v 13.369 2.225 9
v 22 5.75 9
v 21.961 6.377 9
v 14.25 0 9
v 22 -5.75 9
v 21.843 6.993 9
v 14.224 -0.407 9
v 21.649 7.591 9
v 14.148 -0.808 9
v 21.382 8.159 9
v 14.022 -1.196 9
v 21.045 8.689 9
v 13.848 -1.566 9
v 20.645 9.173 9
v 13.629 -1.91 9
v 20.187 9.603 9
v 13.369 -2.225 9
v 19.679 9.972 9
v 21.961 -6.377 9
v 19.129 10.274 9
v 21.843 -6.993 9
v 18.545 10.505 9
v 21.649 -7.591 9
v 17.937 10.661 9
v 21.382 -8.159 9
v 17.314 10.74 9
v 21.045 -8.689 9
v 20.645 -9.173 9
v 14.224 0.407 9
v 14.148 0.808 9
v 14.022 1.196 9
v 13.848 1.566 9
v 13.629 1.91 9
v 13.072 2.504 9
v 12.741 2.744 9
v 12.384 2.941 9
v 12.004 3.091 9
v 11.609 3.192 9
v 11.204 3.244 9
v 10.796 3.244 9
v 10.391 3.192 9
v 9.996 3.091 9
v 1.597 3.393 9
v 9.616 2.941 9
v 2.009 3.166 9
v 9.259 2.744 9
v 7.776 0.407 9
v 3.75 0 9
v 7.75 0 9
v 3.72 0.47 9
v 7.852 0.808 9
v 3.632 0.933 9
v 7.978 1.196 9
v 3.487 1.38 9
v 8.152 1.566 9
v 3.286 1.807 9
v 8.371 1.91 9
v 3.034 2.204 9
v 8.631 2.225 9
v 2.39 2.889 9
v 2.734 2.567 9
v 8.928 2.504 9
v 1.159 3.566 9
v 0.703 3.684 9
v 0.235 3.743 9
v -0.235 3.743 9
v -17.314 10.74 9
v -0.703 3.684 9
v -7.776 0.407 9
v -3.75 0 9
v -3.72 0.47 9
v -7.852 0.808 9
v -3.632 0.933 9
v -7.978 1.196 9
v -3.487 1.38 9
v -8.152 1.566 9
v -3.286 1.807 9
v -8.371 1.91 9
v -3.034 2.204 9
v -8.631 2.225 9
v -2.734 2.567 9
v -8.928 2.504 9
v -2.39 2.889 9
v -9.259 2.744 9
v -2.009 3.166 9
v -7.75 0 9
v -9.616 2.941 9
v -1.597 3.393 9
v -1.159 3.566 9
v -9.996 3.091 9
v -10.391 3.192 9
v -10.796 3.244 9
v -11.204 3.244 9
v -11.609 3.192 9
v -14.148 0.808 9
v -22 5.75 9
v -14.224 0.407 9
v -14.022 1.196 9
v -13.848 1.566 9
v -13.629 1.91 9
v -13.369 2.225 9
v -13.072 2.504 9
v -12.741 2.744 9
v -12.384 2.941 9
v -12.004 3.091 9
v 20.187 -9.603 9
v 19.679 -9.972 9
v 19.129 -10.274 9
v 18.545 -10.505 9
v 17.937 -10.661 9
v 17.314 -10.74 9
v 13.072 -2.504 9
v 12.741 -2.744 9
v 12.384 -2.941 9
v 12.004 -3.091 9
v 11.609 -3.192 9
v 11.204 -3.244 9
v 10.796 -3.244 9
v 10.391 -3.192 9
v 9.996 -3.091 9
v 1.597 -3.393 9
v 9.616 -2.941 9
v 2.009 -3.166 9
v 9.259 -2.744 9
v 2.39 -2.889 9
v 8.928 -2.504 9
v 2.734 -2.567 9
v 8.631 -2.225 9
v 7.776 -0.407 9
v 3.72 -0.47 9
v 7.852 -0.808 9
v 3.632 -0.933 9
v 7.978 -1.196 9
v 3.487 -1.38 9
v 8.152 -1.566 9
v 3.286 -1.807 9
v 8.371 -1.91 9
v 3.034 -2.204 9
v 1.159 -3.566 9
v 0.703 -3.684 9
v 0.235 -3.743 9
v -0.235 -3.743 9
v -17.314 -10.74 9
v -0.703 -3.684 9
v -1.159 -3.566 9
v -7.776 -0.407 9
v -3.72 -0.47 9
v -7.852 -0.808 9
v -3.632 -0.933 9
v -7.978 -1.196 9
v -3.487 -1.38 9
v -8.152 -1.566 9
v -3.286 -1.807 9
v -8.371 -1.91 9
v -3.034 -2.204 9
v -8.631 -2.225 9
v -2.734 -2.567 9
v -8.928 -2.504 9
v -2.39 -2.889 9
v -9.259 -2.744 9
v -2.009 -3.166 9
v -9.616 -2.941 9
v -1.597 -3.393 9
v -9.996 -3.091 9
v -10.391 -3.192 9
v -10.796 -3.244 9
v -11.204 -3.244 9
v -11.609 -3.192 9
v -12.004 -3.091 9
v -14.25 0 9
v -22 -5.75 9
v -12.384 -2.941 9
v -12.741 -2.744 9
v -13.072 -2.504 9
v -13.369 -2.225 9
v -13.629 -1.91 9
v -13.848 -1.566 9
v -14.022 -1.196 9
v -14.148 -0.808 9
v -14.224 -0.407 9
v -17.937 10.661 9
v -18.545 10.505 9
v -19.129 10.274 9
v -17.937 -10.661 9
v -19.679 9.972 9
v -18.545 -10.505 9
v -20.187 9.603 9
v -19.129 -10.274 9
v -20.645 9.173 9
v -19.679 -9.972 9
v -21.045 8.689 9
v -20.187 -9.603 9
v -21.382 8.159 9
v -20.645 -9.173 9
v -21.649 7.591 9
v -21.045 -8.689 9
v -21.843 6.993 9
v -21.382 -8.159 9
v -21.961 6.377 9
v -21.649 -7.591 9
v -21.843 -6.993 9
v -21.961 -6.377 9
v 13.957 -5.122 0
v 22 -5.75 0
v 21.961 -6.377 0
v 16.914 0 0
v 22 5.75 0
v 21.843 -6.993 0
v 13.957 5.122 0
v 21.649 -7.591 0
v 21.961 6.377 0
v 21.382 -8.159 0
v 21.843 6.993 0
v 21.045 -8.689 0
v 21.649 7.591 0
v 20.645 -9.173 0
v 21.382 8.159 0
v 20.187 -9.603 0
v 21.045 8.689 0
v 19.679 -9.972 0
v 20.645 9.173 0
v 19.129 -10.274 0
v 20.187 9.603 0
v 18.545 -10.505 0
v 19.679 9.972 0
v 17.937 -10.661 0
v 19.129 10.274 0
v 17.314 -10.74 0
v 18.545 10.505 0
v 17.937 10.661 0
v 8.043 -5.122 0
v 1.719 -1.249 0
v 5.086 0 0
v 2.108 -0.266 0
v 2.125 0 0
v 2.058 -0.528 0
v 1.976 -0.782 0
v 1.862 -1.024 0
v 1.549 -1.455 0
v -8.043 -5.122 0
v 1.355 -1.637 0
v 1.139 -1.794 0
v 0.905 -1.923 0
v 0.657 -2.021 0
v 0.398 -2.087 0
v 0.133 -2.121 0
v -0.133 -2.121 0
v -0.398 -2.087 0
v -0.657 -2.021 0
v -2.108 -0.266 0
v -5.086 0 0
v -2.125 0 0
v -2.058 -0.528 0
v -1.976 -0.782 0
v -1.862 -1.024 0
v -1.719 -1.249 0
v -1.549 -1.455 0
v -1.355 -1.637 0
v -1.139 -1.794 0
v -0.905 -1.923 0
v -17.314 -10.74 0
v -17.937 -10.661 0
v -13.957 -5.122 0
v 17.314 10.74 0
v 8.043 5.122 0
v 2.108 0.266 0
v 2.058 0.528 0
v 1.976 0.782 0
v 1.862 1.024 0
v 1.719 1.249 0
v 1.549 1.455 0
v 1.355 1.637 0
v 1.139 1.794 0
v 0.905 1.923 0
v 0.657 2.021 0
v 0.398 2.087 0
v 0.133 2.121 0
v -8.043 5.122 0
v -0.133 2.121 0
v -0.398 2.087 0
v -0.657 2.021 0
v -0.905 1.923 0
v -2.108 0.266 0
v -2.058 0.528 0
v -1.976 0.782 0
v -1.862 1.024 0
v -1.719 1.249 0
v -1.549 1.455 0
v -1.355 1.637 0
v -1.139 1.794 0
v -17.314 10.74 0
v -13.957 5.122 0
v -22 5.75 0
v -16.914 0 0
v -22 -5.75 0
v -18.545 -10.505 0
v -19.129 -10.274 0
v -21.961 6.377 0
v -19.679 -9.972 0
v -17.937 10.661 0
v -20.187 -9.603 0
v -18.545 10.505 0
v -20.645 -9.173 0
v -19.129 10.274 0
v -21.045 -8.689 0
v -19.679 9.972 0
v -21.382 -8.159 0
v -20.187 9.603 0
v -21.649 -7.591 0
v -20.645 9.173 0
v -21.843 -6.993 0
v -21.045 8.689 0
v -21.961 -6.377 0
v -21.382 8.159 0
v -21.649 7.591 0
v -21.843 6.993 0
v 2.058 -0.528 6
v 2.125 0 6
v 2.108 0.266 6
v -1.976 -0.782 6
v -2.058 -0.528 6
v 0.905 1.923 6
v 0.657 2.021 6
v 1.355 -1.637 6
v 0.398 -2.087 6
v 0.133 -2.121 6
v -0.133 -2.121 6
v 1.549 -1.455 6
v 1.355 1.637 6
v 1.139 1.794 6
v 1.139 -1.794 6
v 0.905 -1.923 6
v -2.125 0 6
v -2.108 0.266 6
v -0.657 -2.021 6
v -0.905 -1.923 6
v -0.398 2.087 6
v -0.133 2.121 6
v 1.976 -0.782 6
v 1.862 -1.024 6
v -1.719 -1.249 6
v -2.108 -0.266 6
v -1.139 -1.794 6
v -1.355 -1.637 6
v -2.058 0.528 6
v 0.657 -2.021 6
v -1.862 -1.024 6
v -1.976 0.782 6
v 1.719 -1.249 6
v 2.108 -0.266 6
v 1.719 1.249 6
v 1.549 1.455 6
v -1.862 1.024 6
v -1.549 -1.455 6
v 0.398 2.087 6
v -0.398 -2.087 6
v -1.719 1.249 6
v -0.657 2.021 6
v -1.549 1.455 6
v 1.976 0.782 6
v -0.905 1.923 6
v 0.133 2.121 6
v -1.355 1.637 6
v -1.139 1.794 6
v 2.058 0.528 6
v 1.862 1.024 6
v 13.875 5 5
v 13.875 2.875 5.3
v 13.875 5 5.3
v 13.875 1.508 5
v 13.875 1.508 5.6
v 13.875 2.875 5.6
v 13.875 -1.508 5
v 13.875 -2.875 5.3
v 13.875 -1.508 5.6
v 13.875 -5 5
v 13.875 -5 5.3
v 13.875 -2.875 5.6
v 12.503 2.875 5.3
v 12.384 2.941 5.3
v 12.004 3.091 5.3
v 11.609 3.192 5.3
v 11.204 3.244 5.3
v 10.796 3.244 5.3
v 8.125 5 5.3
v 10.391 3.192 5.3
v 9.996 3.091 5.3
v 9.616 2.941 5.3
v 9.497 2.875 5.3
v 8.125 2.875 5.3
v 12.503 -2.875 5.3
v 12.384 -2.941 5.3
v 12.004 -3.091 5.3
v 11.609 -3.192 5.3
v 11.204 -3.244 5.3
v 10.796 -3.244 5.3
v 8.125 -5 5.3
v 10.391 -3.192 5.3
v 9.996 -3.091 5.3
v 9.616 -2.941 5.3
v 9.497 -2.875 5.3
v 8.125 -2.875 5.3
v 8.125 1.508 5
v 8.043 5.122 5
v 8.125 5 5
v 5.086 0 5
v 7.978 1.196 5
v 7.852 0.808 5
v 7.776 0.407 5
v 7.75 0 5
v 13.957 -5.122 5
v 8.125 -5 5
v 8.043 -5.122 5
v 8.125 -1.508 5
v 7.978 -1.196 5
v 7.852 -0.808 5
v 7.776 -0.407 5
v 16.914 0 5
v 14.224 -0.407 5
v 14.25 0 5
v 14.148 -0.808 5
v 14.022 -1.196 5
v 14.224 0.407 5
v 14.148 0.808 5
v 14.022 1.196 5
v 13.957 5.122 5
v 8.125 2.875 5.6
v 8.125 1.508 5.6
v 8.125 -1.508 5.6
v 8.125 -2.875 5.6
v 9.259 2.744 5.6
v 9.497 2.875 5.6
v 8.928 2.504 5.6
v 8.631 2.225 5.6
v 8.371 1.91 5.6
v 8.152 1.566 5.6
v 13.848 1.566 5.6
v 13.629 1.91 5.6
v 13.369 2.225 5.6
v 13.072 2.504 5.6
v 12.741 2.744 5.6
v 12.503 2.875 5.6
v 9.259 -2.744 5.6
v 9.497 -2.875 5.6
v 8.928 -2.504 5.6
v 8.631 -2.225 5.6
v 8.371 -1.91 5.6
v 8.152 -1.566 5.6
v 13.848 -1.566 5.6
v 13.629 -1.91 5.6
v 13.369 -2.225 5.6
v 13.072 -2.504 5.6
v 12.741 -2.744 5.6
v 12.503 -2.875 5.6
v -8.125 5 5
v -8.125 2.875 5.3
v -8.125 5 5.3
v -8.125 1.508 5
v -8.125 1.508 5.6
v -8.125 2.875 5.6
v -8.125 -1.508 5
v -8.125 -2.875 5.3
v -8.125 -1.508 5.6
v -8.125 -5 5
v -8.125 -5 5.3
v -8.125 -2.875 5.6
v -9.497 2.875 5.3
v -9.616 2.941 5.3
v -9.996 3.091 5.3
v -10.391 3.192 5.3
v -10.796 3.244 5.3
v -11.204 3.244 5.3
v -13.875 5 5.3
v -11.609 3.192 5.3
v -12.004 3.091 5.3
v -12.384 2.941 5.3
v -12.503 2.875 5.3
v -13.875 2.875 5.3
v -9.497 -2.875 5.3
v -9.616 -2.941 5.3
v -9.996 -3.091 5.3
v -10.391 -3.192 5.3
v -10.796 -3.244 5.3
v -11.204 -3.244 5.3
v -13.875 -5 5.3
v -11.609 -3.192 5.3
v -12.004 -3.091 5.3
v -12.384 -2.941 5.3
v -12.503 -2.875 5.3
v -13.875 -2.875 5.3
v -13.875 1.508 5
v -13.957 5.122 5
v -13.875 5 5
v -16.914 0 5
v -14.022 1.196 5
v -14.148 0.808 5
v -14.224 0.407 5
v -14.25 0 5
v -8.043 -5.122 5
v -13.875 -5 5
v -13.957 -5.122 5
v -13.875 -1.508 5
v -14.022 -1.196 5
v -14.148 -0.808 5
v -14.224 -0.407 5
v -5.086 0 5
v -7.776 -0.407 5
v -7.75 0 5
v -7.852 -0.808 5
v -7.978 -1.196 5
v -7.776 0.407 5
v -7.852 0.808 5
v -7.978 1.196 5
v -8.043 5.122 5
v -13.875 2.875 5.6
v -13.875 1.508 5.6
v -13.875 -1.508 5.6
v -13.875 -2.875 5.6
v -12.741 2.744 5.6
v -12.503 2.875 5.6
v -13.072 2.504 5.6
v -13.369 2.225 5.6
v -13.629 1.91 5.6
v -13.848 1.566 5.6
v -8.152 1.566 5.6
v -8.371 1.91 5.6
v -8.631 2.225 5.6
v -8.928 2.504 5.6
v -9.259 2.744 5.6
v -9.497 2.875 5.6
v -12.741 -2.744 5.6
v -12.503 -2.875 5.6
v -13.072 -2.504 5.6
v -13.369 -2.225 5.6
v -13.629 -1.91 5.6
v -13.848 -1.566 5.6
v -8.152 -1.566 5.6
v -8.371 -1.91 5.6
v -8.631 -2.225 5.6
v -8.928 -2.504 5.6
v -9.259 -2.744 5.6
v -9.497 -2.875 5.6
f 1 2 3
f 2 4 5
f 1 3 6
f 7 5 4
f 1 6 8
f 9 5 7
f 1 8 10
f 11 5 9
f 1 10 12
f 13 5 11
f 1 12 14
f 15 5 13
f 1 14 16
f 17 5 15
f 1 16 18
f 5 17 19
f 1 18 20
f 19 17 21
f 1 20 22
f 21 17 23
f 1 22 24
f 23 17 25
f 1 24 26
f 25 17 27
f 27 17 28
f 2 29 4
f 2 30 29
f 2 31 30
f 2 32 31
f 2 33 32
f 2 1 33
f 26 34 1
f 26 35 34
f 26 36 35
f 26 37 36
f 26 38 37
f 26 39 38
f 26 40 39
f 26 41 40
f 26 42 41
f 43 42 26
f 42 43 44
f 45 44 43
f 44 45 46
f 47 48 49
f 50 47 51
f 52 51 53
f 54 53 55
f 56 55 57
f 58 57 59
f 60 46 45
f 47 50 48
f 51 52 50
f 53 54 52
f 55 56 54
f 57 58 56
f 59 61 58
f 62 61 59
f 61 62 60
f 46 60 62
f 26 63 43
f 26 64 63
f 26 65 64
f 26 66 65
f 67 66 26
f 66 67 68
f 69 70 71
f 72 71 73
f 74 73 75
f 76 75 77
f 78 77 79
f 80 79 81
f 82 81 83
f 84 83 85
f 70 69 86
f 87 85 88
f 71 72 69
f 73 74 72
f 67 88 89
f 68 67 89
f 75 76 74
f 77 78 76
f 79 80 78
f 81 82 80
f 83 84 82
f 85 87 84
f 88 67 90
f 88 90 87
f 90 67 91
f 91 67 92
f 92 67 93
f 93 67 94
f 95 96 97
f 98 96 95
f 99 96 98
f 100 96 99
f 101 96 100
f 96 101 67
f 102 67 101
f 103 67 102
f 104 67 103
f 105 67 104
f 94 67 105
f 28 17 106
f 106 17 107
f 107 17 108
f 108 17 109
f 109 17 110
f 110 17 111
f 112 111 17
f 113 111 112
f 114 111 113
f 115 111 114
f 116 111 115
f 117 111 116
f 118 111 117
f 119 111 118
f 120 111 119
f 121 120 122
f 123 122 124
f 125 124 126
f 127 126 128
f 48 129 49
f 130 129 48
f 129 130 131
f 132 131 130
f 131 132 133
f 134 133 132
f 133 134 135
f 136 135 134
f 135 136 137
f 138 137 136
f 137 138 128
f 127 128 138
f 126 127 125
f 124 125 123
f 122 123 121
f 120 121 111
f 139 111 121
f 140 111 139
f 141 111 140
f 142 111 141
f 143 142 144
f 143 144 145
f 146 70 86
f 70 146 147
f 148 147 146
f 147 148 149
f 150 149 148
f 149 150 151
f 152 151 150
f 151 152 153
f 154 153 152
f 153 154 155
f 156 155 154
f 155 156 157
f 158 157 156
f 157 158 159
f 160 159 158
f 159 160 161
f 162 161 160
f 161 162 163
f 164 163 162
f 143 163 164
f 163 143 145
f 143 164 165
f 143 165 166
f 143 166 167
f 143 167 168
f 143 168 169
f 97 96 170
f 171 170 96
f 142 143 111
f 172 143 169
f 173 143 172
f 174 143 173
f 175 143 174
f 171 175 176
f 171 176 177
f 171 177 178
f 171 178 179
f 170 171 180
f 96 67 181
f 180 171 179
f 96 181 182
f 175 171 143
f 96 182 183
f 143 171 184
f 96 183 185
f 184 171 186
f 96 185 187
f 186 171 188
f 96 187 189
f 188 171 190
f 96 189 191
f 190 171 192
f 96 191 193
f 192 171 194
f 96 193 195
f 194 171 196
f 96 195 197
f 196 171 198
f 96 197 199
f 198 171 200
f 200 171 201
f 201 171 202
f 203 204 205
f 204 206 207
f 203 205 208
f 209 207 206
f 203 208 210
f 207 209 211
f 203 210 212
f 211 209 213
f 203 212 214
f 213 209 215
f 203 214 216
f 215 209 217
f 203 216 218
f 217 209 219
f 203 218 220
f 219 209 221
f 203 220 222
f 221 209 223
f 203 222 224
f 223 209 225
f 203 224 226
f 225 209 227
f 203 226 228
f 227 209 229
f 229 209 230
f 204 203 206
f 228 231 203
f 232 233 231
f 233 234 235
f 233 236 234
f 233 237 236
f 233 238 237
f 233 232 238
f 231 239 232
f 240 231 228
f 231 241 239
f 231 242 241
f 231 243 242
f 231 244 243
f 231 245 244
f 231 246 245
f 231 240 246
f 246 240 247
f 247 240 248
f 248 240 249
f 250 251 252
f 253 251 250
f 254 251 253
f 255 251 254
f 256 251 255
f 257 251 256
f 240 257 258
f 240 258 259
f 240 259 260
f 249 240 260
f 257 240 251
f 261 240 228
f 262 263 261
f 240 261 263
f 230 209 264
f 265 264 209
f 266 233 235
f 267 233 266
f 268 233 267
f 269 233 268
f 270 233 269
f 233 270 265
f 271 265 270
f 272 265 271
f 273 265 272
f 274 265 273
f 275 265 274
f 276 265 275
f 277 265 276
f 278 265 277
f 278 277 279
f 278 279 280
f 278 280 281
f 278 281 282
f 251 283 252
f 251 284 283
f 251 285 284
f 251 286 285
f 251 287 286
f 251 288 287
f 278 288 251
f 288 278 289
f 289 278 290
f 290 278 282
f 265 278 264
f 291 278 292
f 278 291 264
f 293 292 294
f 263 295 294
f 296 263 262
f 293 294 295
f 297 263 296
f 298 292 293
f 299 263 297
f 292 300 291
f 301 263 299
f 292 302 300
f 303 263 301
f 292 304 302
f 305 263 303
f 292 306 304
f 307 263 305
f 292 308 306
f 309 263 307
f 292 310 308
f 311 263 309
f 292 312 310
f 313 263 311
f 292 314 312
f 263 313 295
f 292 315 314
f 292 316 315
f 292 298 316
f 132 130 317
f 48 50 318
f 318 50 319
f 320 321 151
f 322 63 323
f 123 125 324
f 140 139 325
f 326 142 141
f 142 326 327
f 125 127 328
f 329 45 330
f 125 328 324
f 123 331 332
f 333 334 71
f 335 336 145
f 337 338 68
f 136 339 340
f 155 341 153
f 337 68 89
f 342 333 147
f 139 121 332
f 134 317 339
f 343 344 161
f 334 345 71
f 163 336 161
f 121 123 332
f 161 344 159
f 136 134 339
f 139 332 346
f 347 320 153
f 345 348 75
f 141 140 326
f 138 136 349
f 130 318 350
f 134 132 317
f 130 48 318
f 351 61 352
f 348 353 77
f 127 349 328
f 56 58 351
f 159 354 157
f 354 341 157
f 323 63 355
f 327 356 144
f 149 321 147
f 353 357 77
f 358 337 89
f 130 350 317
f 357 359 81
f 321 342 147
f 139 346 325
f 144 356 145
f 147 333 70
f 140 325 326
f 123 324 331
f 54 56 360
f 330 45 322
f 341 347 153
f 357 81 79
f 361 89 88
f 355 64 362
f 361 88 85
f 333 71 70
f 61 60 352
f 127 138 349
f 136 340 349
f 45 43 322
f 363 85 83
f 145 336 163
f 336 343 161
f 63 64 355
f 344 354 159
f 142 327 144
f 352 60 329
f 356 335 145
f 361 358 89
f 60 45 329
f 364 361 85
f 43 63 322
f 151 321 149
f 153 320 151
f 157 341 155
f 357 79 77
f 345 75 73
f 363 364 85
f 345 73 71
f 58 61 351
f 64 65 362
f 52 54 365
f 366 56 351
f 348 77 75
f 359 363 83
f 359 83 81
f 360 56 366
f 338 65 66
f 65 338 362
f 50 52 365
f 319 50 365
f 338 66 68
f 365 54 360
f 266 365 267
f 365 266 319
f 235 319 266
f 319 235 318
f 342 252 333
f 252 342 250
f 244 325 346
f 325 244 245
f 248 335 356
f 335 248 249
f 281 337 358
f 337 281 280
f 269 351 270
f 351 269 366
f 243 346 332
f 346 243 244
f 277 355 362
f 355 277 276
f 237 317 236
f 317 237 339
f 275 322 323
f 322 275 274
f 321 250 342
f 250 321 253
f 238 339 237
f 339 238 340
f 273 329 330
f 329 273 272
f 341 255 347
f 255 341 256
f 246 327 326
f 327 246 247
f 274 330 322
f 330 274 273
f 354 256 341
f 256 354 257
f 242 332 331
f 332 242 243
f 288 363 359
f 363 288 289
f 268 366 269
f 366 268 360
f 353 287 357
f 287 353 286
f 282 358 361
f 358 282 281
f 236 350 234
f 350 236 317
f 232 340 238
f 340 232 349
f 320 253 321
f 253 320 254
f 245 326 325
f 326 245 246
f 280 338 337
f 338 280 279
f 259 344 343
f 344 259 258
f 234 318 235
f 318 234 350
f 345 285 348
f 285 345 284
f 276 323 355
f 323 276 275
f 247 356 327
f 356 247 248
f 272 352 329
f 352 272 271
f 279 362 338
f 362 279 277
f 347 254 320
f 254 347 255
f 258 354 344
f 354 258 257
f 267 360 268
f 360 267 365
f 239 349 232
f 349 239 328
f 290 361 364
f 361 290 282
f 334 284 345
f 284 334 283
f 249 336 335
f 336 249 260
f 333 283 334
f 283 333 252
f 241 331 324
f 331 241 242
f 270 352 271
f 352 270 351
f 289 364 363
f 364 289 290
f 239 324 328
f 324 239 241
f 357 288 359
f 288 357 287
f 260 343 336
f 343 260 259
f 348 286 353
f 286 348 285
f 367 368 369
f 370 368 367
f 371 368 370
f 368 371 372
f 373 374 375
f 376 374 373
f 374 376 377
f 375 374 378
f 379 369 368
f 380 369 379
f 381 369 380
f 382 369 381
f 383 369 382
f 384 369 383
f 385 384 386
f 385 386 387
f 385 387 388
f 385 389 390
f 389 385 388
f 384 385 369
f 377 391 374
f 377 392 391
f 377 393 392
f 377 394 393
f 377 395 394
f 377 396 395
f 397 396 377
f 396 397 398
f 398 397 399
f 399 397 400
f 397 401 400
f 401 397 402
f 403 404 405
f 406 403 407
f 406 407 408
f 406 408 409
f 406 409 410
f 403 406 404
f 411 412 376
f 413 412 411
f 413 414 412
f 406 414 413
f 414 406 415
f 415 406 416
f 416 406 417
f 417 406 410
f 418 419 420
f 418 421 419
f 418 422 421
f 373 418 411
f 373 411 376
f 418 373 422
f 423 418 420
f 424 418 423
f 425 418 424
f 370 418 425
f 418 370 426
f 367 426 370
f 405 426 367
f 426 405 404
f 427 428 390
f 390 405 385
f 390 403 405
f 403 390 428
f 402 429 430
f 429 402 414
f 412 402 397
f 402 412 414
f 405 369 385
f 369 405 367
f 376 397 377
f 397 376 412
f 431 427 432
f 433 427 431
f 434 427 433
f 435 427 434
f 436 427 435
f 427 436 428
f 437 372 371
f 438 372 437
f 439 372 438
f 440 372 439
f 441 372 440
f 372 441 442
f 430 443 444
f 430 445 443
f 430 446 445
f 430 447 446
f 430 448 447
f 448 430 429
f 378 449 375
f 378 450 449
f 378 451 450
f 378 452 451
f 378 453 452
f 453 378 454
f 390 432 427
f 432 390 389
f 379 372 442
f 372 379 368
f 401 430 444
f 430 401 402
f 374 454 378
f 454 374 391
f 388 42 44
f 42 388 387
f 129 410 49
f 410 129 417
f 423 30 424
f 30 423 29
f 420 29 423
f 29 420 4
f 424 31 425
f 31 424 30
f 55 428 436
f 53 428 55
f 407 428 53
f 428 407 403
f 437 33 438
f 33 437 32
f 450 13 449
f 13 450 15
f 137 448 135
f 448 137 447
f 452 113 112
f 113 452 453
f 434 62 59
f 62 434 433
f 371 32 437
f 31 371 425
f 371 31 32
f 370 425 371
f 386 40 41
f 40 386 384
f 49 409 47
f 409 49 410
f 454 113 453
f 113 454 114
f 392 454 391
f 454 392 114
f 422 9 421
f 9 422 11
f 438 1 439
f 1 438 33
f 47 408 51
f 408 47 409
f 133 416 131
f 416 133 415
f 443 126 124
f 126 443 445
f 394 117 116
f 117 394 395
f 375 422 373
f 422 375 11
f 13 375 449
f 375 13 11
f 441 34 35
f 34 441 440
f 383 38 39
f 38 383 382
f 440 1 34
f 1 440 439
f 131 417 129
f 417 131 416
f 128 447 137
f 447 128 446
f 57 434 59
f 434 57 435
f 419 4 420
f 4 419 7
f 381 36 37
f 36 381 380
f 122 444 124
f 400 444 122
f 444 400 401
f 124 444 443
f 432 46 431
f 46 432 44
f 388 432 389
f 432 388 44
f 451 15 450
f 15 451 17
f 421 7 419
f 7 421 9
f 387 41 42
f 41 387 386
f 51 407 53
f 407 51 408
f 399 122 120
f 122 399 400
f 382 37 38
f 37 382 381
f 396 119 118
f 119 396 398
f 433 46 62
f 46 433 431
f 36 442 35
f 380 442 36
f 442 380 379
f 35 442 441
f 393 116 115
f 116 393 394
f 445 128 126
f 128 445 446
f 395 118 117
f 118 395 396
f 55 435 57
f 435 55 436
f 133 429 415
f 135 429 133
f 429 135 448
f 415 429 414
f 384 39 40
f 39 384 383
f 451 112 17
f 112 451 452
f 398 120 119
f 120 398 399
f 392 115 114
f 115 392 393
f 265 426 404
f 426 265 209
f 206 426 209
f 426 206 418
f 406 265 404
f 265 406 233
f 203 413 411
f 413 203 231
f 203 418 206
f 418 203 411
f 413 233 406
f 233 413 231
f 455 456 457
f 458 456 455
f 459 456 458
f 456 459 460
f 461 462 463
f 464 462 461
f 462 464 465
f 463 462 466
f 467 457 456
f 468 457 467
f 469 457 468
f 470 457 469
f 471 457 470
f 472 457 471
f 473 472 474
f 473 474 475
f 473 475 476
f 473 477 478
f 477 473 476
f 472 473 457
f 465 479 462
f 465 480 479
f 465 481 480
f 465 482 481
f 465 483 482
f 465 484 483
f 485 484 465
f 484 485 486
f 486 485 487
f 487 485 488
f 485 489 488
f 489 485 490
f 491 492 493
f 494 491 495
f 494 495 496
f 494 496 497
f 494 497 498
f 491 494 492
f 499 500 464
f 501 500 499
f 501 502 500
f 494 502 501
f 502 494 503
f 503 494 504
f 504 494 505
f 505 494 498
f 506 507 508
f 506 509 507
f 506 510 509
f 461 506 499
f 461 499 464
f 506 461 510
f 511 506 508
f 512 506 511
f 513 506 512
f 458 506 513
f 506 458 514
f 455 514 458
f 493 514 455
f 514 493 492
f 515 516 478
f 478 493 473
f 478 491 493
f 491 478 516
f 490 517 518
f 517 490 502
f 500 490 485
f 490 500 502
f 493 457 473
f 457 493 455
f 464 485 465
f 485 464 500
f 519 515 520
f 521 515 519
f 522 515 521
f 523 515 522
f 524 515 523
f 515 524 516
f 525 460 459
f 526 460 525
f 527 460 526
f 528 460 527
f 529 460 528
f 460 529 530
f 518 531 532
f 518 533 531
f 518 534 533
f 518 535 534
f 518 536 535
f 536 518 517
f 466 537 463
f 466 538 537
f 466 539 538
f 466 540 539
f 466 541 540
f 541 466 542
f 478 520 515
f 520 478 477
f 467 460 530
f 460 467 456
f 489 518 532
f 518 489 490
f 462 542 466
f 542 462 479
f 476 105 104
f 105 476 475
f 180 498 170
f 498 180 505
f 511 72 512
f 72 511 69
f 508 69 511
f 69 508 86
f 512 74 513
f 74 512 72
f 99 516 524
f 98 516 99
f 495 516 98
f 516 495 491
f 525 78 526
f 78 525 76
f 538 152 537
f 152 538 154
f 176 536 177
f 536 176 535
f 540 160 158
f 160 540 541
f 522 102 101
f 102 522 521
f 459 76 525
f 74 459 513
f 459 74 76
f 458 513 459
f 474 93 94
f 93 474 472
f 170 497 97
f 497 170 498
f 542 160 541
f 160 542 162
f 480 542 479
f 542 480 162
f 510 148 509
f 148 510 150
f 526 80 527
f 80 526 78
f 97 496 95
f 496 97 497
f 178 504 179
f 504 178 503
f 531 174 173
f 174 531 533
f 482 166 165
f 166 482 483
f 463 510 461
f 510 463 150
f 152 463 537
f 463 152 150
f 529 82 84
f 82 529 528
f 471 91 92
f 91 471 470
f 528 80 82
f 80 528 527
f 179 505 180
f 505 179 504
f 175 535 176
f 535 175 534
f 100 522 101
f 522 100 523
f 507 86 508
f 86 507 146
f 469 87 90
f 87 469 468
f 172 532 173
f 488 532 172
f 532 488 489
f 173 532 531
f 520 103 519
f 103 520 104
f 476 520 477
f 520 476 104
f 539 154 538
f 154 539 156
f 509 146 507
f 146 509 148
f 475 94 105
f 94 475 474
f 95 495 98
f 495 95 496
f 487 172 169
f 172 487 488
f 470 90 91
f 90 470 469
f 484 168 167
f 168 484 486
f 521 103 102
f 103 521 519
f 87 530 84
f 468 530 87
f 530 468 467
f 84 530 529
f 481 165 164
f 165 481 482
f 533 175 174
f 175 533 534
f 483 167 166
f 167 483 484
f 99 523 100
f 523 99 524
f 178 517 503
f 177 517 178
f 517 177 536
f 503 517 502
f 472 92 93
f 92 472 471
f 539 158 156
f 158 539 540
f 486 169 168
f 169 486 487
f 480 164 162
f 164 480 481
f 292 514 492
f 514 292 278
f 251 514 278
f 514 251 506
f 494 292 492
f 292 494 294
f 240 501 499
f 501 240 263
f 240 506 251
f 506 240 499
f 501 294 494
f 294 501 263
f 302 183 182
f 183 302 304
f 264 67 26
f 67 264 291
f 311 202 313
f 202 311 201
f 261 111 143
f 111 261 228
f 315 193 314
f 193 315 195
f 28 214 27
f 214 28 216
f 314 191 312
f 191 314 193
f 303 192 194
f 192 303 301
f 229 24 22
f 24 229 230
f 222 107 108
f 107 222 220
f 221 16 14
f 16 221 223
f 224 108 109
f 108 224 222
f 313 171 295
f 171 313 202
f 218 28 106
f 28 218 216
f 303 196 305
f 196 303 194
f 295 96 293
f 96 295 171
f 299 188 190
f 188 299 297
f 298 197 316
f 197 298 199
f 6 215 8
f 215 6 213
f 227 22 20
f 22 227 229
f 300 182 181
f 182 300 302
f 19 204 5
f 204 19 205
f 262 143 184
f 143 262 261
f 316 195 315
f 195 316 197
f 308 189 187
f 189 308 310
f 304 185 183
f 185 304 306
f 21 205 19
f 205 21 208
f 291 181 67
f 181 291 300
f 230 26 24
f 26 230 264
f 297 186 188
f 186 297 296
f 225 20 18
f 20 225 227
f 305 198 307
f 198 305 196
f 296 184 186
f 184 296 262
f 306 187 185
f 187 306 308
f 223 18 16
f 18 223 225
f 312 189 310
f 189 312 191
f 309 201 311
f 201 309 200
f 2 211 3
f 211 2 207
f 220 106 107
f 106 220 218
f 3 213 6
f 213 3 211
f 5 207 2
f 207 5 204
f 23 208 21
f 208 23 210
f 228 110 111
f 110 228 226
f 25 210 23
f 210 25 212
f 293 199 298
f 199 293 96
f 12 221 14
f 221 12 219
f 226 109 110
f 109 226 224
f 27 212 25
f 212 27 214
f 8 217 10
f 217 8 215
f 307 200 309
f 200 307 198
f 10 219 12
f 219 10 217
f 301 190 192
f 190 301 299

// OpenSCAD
$fn = 50;


difference() {
	union() {
		hull() {
			translate(v = [-17.0000000000, 5.7500000000, 0]) {
				cylinder(h = 9, r = 5);
			}
			translate(v = [17.0000000000, 5.7500000000, 0]) {
				cylinder(h = 9, r = 5);
			}
			translate(v = [-17.0000000000, -5.7500000000, 0]) {
				cylinder(h = 9, r = 5);
			}
			translate(v = [17.0000000000, -5.7500000000, 0]) {
				cylinder(h = 9, r = 5);
			}
		}
	}
	union() {
		translate(v = [0, 0, 9]) {
			rotate(a = [0, 0, 0]) {
				difference() {
					union() {
						#translate(v = [0, 0, -9.0000000000]) {
							cylinder(h = 9, r = 2.0000000000);
						}
						#translate(v = [0, 0, -3]) {
							cylinder(h = 3, r1 = 2.1250000000, r2 = 3.7500000000);
						}
						#translate(v = [0, 0, -9.0000000000]) {
							cylinder(h = 9, r = 2.1250000000);
						}
						#translate(v = [0, 0, -9.0000000000]) {
							cylinder(h = 9, r = 2.0000000000);
						}
					}
					union();
				}
			}
		}
		translate(v = [11.0000000000, 0, 0]) {
			rotate(a = [0, 0, 0]) {
				difference() {
					union() {
						#translate(v = [-2.8750000000, -5.0000000000, -0.3000000000]) {
							cube(size = [5.7500000000, 10, 0.3000000000]);
						}
						#translate(v = [-2.8750000000, -2.8750000000, -0.6000000000]) {
							cube(size = [5.7500000000, 5.7500000000, 0.3000000000]);
						}
						#translate(v = [-2.8750000000, -5.0000000000, 5]) {
							cube(size = [5.7500000000, 10, 0.3000000000]);
						}
						#translate(v = [-2.8750000000, -2.8750000000, 5.3000000000]) {
							cube(size = [5.7500000000, 5.7500000000, 0.3000000000]);
						}
						#translate(v = [0, 0, -100.0000000000]) {
							cylinder(h = 200, r = 3.2500000000);
						}
						#linear_extrude(height = 5) {
							polygon(points = [[5.9142500000, 0.0000000000], [2.9571250000, 5.1218907443], [-2.9571250000, 5.1218907443], [-5.9142500000, 0.0000000000], [-2.9571250000, -5.1218907443], [2.9571250000, -5.1218907443]]);
						}
						#translate(v = [-2.8750000000, -5.0000000000, -0.3000000000]) {
							cube(size = [5.7500000000, 10, 0.3000000000]);
						}
						#translate(v = [-2.8750000000, -2.8750000000, -0.6000000000]) {
							cube(size = [5.7500000000, 5.7500000000, 0.3000000000]);
						}
						#translate(v = [-2.8750000000, -5.0000000000, 5]) {
							cube(size = [5.7500000000, 10, 0.3000000000]);
						}
						#translate(v = [-2.8750000000, -2.8750000000, 5.3000000000]) {
							cube(size = [5.7500000000, 5.7500000000, 0.3000000000]);
						}
						#translate(v = [0, 0, -100.0000000000]) {
							cylinder(h = 200, r = 3.2500000000);
						}
						#translate(v = [-2.8750000000, -5.0000000000, -0.3000000000]) {
							cube(size = [5.7500000000, 10, 0.3000000000]);
						}
						#translate(v = [-2.8750000000, -2.8750000000, -0.6000000000]) {
							cube(size = [5.7500000000, 5.7500000000, 0.3000000000]);
						}
						#translate(v = [-2.8750000000, -5.0000000000, 5]) {
							cube(size = [5.7500000000, 10, 0.3000000000]);
						}
						#translate(v = [-2.8750000000, -2.8750000000, 5.3000000000]) {
							cube(size = [5.7500000000, 5.7500000000, 0.3000000000]);
						}
						#translate(v = [0, 0, -100.0000000000]) {
							cylinder(h = 200, r = 3.2500000000);
						}
					}
					union();
				}
			}
		}
		translate(v = [-11.0000000000, 0, 0]) {
			rotate(a = [0, 0, 0]) {
				difference() {
					union() {
						#translate(v = [-2.8750000000, -5.0000000000, -0.3000000000]) {
							cube(size = [5.7500000000, 10, 0.3000000000]);
						}
						#translate(v = [-2.8750000000, -2.8750000000, -0.6000000000]) {
							cube(size = [5.7500000000, 5.7500000000, 0.3000000000]);
						}
						#translate(v = [-2.8750000000, -5.0000000000, 5]) {
							cube(size = [5.7500000000, 10, 0.3000000000]);
						}
						#translate(v = [-2.8750000000, -2.8750000000, 5.3000000000]) {
							cube(size = [5.7500000000, 5.7500000000, 0.3000000000]);
						}
						#translate(v = [0, 0, -100.0000000000]) {
							cylinder(h = 200, r = 3.2500000000);
						}
						#linear_extrude(height = 5) {
							polygon(points = [[5.9142500000, 0.0000000000], [2.9571250000, 5.1218907443], [-2.9571250000, 5.1218907443], [-5.9142500000, 0.0000000000], [-2.9571250000, -5.1218907443], [2.9571250000, -5.1218907443]]);
						}
						#translate(v = [-2.8750000000, -5.0000000000, -0.3000000000]) {
							cube(size = [5.7500000000, 10, 0.3000000000]);
						}
						#translate(v = [-2.8750000000, -2.8750000000, -0.6000000000]) {
							cube(size = [5.7500000000, 5.7500000000, 0.3000000000]);
						}
						#translate(v = [-2.8750000000, -5.0000000000, 5]) {
							cube(size = [5.7500000000, 10, 0.3000000000]);
						}
						#translate(v = [-2.8750000000, -2.8750000000, 5.3000000000]) {
							cube(size = [5.7500000000, 5.7500000000, 0.3000000000]);
						}
						#translate(v = [0, 0, -100.0000000000]) {
							cylinder(h = 200, r = 3.2500000000);
						}
						#translate(v = [-2.8750000000, -5.0000000000, -0.3000000000]) {
							cube(size = [5.7500000000, 10, 0.3000000000]);
						}
						#translate(v = [-2.8750000000, -2.8750000000, -0.6000000000]) {
							cube(size = [5.7500000000, 5.7500000000, 0.3000000000]);
						}
						#translate(v = [-2.8750000000, -5.0000000000, 5]) {
							cube(size = [5.7500000000, 10, 0.3000000000]);
						}
						#translate(v = [-2.8750000000, -2.8750000000, 5.3000000000]) {
							cube(size = [5.7500000000, 5.7500000000, 0.3000000000]);
						}
						#translate(v = [0, 0, -100.0000000000]) {
							cylinder(h = 200, r = 3.2500000000);
						}
					}
					union();
				}
			}
		}
	}
}
